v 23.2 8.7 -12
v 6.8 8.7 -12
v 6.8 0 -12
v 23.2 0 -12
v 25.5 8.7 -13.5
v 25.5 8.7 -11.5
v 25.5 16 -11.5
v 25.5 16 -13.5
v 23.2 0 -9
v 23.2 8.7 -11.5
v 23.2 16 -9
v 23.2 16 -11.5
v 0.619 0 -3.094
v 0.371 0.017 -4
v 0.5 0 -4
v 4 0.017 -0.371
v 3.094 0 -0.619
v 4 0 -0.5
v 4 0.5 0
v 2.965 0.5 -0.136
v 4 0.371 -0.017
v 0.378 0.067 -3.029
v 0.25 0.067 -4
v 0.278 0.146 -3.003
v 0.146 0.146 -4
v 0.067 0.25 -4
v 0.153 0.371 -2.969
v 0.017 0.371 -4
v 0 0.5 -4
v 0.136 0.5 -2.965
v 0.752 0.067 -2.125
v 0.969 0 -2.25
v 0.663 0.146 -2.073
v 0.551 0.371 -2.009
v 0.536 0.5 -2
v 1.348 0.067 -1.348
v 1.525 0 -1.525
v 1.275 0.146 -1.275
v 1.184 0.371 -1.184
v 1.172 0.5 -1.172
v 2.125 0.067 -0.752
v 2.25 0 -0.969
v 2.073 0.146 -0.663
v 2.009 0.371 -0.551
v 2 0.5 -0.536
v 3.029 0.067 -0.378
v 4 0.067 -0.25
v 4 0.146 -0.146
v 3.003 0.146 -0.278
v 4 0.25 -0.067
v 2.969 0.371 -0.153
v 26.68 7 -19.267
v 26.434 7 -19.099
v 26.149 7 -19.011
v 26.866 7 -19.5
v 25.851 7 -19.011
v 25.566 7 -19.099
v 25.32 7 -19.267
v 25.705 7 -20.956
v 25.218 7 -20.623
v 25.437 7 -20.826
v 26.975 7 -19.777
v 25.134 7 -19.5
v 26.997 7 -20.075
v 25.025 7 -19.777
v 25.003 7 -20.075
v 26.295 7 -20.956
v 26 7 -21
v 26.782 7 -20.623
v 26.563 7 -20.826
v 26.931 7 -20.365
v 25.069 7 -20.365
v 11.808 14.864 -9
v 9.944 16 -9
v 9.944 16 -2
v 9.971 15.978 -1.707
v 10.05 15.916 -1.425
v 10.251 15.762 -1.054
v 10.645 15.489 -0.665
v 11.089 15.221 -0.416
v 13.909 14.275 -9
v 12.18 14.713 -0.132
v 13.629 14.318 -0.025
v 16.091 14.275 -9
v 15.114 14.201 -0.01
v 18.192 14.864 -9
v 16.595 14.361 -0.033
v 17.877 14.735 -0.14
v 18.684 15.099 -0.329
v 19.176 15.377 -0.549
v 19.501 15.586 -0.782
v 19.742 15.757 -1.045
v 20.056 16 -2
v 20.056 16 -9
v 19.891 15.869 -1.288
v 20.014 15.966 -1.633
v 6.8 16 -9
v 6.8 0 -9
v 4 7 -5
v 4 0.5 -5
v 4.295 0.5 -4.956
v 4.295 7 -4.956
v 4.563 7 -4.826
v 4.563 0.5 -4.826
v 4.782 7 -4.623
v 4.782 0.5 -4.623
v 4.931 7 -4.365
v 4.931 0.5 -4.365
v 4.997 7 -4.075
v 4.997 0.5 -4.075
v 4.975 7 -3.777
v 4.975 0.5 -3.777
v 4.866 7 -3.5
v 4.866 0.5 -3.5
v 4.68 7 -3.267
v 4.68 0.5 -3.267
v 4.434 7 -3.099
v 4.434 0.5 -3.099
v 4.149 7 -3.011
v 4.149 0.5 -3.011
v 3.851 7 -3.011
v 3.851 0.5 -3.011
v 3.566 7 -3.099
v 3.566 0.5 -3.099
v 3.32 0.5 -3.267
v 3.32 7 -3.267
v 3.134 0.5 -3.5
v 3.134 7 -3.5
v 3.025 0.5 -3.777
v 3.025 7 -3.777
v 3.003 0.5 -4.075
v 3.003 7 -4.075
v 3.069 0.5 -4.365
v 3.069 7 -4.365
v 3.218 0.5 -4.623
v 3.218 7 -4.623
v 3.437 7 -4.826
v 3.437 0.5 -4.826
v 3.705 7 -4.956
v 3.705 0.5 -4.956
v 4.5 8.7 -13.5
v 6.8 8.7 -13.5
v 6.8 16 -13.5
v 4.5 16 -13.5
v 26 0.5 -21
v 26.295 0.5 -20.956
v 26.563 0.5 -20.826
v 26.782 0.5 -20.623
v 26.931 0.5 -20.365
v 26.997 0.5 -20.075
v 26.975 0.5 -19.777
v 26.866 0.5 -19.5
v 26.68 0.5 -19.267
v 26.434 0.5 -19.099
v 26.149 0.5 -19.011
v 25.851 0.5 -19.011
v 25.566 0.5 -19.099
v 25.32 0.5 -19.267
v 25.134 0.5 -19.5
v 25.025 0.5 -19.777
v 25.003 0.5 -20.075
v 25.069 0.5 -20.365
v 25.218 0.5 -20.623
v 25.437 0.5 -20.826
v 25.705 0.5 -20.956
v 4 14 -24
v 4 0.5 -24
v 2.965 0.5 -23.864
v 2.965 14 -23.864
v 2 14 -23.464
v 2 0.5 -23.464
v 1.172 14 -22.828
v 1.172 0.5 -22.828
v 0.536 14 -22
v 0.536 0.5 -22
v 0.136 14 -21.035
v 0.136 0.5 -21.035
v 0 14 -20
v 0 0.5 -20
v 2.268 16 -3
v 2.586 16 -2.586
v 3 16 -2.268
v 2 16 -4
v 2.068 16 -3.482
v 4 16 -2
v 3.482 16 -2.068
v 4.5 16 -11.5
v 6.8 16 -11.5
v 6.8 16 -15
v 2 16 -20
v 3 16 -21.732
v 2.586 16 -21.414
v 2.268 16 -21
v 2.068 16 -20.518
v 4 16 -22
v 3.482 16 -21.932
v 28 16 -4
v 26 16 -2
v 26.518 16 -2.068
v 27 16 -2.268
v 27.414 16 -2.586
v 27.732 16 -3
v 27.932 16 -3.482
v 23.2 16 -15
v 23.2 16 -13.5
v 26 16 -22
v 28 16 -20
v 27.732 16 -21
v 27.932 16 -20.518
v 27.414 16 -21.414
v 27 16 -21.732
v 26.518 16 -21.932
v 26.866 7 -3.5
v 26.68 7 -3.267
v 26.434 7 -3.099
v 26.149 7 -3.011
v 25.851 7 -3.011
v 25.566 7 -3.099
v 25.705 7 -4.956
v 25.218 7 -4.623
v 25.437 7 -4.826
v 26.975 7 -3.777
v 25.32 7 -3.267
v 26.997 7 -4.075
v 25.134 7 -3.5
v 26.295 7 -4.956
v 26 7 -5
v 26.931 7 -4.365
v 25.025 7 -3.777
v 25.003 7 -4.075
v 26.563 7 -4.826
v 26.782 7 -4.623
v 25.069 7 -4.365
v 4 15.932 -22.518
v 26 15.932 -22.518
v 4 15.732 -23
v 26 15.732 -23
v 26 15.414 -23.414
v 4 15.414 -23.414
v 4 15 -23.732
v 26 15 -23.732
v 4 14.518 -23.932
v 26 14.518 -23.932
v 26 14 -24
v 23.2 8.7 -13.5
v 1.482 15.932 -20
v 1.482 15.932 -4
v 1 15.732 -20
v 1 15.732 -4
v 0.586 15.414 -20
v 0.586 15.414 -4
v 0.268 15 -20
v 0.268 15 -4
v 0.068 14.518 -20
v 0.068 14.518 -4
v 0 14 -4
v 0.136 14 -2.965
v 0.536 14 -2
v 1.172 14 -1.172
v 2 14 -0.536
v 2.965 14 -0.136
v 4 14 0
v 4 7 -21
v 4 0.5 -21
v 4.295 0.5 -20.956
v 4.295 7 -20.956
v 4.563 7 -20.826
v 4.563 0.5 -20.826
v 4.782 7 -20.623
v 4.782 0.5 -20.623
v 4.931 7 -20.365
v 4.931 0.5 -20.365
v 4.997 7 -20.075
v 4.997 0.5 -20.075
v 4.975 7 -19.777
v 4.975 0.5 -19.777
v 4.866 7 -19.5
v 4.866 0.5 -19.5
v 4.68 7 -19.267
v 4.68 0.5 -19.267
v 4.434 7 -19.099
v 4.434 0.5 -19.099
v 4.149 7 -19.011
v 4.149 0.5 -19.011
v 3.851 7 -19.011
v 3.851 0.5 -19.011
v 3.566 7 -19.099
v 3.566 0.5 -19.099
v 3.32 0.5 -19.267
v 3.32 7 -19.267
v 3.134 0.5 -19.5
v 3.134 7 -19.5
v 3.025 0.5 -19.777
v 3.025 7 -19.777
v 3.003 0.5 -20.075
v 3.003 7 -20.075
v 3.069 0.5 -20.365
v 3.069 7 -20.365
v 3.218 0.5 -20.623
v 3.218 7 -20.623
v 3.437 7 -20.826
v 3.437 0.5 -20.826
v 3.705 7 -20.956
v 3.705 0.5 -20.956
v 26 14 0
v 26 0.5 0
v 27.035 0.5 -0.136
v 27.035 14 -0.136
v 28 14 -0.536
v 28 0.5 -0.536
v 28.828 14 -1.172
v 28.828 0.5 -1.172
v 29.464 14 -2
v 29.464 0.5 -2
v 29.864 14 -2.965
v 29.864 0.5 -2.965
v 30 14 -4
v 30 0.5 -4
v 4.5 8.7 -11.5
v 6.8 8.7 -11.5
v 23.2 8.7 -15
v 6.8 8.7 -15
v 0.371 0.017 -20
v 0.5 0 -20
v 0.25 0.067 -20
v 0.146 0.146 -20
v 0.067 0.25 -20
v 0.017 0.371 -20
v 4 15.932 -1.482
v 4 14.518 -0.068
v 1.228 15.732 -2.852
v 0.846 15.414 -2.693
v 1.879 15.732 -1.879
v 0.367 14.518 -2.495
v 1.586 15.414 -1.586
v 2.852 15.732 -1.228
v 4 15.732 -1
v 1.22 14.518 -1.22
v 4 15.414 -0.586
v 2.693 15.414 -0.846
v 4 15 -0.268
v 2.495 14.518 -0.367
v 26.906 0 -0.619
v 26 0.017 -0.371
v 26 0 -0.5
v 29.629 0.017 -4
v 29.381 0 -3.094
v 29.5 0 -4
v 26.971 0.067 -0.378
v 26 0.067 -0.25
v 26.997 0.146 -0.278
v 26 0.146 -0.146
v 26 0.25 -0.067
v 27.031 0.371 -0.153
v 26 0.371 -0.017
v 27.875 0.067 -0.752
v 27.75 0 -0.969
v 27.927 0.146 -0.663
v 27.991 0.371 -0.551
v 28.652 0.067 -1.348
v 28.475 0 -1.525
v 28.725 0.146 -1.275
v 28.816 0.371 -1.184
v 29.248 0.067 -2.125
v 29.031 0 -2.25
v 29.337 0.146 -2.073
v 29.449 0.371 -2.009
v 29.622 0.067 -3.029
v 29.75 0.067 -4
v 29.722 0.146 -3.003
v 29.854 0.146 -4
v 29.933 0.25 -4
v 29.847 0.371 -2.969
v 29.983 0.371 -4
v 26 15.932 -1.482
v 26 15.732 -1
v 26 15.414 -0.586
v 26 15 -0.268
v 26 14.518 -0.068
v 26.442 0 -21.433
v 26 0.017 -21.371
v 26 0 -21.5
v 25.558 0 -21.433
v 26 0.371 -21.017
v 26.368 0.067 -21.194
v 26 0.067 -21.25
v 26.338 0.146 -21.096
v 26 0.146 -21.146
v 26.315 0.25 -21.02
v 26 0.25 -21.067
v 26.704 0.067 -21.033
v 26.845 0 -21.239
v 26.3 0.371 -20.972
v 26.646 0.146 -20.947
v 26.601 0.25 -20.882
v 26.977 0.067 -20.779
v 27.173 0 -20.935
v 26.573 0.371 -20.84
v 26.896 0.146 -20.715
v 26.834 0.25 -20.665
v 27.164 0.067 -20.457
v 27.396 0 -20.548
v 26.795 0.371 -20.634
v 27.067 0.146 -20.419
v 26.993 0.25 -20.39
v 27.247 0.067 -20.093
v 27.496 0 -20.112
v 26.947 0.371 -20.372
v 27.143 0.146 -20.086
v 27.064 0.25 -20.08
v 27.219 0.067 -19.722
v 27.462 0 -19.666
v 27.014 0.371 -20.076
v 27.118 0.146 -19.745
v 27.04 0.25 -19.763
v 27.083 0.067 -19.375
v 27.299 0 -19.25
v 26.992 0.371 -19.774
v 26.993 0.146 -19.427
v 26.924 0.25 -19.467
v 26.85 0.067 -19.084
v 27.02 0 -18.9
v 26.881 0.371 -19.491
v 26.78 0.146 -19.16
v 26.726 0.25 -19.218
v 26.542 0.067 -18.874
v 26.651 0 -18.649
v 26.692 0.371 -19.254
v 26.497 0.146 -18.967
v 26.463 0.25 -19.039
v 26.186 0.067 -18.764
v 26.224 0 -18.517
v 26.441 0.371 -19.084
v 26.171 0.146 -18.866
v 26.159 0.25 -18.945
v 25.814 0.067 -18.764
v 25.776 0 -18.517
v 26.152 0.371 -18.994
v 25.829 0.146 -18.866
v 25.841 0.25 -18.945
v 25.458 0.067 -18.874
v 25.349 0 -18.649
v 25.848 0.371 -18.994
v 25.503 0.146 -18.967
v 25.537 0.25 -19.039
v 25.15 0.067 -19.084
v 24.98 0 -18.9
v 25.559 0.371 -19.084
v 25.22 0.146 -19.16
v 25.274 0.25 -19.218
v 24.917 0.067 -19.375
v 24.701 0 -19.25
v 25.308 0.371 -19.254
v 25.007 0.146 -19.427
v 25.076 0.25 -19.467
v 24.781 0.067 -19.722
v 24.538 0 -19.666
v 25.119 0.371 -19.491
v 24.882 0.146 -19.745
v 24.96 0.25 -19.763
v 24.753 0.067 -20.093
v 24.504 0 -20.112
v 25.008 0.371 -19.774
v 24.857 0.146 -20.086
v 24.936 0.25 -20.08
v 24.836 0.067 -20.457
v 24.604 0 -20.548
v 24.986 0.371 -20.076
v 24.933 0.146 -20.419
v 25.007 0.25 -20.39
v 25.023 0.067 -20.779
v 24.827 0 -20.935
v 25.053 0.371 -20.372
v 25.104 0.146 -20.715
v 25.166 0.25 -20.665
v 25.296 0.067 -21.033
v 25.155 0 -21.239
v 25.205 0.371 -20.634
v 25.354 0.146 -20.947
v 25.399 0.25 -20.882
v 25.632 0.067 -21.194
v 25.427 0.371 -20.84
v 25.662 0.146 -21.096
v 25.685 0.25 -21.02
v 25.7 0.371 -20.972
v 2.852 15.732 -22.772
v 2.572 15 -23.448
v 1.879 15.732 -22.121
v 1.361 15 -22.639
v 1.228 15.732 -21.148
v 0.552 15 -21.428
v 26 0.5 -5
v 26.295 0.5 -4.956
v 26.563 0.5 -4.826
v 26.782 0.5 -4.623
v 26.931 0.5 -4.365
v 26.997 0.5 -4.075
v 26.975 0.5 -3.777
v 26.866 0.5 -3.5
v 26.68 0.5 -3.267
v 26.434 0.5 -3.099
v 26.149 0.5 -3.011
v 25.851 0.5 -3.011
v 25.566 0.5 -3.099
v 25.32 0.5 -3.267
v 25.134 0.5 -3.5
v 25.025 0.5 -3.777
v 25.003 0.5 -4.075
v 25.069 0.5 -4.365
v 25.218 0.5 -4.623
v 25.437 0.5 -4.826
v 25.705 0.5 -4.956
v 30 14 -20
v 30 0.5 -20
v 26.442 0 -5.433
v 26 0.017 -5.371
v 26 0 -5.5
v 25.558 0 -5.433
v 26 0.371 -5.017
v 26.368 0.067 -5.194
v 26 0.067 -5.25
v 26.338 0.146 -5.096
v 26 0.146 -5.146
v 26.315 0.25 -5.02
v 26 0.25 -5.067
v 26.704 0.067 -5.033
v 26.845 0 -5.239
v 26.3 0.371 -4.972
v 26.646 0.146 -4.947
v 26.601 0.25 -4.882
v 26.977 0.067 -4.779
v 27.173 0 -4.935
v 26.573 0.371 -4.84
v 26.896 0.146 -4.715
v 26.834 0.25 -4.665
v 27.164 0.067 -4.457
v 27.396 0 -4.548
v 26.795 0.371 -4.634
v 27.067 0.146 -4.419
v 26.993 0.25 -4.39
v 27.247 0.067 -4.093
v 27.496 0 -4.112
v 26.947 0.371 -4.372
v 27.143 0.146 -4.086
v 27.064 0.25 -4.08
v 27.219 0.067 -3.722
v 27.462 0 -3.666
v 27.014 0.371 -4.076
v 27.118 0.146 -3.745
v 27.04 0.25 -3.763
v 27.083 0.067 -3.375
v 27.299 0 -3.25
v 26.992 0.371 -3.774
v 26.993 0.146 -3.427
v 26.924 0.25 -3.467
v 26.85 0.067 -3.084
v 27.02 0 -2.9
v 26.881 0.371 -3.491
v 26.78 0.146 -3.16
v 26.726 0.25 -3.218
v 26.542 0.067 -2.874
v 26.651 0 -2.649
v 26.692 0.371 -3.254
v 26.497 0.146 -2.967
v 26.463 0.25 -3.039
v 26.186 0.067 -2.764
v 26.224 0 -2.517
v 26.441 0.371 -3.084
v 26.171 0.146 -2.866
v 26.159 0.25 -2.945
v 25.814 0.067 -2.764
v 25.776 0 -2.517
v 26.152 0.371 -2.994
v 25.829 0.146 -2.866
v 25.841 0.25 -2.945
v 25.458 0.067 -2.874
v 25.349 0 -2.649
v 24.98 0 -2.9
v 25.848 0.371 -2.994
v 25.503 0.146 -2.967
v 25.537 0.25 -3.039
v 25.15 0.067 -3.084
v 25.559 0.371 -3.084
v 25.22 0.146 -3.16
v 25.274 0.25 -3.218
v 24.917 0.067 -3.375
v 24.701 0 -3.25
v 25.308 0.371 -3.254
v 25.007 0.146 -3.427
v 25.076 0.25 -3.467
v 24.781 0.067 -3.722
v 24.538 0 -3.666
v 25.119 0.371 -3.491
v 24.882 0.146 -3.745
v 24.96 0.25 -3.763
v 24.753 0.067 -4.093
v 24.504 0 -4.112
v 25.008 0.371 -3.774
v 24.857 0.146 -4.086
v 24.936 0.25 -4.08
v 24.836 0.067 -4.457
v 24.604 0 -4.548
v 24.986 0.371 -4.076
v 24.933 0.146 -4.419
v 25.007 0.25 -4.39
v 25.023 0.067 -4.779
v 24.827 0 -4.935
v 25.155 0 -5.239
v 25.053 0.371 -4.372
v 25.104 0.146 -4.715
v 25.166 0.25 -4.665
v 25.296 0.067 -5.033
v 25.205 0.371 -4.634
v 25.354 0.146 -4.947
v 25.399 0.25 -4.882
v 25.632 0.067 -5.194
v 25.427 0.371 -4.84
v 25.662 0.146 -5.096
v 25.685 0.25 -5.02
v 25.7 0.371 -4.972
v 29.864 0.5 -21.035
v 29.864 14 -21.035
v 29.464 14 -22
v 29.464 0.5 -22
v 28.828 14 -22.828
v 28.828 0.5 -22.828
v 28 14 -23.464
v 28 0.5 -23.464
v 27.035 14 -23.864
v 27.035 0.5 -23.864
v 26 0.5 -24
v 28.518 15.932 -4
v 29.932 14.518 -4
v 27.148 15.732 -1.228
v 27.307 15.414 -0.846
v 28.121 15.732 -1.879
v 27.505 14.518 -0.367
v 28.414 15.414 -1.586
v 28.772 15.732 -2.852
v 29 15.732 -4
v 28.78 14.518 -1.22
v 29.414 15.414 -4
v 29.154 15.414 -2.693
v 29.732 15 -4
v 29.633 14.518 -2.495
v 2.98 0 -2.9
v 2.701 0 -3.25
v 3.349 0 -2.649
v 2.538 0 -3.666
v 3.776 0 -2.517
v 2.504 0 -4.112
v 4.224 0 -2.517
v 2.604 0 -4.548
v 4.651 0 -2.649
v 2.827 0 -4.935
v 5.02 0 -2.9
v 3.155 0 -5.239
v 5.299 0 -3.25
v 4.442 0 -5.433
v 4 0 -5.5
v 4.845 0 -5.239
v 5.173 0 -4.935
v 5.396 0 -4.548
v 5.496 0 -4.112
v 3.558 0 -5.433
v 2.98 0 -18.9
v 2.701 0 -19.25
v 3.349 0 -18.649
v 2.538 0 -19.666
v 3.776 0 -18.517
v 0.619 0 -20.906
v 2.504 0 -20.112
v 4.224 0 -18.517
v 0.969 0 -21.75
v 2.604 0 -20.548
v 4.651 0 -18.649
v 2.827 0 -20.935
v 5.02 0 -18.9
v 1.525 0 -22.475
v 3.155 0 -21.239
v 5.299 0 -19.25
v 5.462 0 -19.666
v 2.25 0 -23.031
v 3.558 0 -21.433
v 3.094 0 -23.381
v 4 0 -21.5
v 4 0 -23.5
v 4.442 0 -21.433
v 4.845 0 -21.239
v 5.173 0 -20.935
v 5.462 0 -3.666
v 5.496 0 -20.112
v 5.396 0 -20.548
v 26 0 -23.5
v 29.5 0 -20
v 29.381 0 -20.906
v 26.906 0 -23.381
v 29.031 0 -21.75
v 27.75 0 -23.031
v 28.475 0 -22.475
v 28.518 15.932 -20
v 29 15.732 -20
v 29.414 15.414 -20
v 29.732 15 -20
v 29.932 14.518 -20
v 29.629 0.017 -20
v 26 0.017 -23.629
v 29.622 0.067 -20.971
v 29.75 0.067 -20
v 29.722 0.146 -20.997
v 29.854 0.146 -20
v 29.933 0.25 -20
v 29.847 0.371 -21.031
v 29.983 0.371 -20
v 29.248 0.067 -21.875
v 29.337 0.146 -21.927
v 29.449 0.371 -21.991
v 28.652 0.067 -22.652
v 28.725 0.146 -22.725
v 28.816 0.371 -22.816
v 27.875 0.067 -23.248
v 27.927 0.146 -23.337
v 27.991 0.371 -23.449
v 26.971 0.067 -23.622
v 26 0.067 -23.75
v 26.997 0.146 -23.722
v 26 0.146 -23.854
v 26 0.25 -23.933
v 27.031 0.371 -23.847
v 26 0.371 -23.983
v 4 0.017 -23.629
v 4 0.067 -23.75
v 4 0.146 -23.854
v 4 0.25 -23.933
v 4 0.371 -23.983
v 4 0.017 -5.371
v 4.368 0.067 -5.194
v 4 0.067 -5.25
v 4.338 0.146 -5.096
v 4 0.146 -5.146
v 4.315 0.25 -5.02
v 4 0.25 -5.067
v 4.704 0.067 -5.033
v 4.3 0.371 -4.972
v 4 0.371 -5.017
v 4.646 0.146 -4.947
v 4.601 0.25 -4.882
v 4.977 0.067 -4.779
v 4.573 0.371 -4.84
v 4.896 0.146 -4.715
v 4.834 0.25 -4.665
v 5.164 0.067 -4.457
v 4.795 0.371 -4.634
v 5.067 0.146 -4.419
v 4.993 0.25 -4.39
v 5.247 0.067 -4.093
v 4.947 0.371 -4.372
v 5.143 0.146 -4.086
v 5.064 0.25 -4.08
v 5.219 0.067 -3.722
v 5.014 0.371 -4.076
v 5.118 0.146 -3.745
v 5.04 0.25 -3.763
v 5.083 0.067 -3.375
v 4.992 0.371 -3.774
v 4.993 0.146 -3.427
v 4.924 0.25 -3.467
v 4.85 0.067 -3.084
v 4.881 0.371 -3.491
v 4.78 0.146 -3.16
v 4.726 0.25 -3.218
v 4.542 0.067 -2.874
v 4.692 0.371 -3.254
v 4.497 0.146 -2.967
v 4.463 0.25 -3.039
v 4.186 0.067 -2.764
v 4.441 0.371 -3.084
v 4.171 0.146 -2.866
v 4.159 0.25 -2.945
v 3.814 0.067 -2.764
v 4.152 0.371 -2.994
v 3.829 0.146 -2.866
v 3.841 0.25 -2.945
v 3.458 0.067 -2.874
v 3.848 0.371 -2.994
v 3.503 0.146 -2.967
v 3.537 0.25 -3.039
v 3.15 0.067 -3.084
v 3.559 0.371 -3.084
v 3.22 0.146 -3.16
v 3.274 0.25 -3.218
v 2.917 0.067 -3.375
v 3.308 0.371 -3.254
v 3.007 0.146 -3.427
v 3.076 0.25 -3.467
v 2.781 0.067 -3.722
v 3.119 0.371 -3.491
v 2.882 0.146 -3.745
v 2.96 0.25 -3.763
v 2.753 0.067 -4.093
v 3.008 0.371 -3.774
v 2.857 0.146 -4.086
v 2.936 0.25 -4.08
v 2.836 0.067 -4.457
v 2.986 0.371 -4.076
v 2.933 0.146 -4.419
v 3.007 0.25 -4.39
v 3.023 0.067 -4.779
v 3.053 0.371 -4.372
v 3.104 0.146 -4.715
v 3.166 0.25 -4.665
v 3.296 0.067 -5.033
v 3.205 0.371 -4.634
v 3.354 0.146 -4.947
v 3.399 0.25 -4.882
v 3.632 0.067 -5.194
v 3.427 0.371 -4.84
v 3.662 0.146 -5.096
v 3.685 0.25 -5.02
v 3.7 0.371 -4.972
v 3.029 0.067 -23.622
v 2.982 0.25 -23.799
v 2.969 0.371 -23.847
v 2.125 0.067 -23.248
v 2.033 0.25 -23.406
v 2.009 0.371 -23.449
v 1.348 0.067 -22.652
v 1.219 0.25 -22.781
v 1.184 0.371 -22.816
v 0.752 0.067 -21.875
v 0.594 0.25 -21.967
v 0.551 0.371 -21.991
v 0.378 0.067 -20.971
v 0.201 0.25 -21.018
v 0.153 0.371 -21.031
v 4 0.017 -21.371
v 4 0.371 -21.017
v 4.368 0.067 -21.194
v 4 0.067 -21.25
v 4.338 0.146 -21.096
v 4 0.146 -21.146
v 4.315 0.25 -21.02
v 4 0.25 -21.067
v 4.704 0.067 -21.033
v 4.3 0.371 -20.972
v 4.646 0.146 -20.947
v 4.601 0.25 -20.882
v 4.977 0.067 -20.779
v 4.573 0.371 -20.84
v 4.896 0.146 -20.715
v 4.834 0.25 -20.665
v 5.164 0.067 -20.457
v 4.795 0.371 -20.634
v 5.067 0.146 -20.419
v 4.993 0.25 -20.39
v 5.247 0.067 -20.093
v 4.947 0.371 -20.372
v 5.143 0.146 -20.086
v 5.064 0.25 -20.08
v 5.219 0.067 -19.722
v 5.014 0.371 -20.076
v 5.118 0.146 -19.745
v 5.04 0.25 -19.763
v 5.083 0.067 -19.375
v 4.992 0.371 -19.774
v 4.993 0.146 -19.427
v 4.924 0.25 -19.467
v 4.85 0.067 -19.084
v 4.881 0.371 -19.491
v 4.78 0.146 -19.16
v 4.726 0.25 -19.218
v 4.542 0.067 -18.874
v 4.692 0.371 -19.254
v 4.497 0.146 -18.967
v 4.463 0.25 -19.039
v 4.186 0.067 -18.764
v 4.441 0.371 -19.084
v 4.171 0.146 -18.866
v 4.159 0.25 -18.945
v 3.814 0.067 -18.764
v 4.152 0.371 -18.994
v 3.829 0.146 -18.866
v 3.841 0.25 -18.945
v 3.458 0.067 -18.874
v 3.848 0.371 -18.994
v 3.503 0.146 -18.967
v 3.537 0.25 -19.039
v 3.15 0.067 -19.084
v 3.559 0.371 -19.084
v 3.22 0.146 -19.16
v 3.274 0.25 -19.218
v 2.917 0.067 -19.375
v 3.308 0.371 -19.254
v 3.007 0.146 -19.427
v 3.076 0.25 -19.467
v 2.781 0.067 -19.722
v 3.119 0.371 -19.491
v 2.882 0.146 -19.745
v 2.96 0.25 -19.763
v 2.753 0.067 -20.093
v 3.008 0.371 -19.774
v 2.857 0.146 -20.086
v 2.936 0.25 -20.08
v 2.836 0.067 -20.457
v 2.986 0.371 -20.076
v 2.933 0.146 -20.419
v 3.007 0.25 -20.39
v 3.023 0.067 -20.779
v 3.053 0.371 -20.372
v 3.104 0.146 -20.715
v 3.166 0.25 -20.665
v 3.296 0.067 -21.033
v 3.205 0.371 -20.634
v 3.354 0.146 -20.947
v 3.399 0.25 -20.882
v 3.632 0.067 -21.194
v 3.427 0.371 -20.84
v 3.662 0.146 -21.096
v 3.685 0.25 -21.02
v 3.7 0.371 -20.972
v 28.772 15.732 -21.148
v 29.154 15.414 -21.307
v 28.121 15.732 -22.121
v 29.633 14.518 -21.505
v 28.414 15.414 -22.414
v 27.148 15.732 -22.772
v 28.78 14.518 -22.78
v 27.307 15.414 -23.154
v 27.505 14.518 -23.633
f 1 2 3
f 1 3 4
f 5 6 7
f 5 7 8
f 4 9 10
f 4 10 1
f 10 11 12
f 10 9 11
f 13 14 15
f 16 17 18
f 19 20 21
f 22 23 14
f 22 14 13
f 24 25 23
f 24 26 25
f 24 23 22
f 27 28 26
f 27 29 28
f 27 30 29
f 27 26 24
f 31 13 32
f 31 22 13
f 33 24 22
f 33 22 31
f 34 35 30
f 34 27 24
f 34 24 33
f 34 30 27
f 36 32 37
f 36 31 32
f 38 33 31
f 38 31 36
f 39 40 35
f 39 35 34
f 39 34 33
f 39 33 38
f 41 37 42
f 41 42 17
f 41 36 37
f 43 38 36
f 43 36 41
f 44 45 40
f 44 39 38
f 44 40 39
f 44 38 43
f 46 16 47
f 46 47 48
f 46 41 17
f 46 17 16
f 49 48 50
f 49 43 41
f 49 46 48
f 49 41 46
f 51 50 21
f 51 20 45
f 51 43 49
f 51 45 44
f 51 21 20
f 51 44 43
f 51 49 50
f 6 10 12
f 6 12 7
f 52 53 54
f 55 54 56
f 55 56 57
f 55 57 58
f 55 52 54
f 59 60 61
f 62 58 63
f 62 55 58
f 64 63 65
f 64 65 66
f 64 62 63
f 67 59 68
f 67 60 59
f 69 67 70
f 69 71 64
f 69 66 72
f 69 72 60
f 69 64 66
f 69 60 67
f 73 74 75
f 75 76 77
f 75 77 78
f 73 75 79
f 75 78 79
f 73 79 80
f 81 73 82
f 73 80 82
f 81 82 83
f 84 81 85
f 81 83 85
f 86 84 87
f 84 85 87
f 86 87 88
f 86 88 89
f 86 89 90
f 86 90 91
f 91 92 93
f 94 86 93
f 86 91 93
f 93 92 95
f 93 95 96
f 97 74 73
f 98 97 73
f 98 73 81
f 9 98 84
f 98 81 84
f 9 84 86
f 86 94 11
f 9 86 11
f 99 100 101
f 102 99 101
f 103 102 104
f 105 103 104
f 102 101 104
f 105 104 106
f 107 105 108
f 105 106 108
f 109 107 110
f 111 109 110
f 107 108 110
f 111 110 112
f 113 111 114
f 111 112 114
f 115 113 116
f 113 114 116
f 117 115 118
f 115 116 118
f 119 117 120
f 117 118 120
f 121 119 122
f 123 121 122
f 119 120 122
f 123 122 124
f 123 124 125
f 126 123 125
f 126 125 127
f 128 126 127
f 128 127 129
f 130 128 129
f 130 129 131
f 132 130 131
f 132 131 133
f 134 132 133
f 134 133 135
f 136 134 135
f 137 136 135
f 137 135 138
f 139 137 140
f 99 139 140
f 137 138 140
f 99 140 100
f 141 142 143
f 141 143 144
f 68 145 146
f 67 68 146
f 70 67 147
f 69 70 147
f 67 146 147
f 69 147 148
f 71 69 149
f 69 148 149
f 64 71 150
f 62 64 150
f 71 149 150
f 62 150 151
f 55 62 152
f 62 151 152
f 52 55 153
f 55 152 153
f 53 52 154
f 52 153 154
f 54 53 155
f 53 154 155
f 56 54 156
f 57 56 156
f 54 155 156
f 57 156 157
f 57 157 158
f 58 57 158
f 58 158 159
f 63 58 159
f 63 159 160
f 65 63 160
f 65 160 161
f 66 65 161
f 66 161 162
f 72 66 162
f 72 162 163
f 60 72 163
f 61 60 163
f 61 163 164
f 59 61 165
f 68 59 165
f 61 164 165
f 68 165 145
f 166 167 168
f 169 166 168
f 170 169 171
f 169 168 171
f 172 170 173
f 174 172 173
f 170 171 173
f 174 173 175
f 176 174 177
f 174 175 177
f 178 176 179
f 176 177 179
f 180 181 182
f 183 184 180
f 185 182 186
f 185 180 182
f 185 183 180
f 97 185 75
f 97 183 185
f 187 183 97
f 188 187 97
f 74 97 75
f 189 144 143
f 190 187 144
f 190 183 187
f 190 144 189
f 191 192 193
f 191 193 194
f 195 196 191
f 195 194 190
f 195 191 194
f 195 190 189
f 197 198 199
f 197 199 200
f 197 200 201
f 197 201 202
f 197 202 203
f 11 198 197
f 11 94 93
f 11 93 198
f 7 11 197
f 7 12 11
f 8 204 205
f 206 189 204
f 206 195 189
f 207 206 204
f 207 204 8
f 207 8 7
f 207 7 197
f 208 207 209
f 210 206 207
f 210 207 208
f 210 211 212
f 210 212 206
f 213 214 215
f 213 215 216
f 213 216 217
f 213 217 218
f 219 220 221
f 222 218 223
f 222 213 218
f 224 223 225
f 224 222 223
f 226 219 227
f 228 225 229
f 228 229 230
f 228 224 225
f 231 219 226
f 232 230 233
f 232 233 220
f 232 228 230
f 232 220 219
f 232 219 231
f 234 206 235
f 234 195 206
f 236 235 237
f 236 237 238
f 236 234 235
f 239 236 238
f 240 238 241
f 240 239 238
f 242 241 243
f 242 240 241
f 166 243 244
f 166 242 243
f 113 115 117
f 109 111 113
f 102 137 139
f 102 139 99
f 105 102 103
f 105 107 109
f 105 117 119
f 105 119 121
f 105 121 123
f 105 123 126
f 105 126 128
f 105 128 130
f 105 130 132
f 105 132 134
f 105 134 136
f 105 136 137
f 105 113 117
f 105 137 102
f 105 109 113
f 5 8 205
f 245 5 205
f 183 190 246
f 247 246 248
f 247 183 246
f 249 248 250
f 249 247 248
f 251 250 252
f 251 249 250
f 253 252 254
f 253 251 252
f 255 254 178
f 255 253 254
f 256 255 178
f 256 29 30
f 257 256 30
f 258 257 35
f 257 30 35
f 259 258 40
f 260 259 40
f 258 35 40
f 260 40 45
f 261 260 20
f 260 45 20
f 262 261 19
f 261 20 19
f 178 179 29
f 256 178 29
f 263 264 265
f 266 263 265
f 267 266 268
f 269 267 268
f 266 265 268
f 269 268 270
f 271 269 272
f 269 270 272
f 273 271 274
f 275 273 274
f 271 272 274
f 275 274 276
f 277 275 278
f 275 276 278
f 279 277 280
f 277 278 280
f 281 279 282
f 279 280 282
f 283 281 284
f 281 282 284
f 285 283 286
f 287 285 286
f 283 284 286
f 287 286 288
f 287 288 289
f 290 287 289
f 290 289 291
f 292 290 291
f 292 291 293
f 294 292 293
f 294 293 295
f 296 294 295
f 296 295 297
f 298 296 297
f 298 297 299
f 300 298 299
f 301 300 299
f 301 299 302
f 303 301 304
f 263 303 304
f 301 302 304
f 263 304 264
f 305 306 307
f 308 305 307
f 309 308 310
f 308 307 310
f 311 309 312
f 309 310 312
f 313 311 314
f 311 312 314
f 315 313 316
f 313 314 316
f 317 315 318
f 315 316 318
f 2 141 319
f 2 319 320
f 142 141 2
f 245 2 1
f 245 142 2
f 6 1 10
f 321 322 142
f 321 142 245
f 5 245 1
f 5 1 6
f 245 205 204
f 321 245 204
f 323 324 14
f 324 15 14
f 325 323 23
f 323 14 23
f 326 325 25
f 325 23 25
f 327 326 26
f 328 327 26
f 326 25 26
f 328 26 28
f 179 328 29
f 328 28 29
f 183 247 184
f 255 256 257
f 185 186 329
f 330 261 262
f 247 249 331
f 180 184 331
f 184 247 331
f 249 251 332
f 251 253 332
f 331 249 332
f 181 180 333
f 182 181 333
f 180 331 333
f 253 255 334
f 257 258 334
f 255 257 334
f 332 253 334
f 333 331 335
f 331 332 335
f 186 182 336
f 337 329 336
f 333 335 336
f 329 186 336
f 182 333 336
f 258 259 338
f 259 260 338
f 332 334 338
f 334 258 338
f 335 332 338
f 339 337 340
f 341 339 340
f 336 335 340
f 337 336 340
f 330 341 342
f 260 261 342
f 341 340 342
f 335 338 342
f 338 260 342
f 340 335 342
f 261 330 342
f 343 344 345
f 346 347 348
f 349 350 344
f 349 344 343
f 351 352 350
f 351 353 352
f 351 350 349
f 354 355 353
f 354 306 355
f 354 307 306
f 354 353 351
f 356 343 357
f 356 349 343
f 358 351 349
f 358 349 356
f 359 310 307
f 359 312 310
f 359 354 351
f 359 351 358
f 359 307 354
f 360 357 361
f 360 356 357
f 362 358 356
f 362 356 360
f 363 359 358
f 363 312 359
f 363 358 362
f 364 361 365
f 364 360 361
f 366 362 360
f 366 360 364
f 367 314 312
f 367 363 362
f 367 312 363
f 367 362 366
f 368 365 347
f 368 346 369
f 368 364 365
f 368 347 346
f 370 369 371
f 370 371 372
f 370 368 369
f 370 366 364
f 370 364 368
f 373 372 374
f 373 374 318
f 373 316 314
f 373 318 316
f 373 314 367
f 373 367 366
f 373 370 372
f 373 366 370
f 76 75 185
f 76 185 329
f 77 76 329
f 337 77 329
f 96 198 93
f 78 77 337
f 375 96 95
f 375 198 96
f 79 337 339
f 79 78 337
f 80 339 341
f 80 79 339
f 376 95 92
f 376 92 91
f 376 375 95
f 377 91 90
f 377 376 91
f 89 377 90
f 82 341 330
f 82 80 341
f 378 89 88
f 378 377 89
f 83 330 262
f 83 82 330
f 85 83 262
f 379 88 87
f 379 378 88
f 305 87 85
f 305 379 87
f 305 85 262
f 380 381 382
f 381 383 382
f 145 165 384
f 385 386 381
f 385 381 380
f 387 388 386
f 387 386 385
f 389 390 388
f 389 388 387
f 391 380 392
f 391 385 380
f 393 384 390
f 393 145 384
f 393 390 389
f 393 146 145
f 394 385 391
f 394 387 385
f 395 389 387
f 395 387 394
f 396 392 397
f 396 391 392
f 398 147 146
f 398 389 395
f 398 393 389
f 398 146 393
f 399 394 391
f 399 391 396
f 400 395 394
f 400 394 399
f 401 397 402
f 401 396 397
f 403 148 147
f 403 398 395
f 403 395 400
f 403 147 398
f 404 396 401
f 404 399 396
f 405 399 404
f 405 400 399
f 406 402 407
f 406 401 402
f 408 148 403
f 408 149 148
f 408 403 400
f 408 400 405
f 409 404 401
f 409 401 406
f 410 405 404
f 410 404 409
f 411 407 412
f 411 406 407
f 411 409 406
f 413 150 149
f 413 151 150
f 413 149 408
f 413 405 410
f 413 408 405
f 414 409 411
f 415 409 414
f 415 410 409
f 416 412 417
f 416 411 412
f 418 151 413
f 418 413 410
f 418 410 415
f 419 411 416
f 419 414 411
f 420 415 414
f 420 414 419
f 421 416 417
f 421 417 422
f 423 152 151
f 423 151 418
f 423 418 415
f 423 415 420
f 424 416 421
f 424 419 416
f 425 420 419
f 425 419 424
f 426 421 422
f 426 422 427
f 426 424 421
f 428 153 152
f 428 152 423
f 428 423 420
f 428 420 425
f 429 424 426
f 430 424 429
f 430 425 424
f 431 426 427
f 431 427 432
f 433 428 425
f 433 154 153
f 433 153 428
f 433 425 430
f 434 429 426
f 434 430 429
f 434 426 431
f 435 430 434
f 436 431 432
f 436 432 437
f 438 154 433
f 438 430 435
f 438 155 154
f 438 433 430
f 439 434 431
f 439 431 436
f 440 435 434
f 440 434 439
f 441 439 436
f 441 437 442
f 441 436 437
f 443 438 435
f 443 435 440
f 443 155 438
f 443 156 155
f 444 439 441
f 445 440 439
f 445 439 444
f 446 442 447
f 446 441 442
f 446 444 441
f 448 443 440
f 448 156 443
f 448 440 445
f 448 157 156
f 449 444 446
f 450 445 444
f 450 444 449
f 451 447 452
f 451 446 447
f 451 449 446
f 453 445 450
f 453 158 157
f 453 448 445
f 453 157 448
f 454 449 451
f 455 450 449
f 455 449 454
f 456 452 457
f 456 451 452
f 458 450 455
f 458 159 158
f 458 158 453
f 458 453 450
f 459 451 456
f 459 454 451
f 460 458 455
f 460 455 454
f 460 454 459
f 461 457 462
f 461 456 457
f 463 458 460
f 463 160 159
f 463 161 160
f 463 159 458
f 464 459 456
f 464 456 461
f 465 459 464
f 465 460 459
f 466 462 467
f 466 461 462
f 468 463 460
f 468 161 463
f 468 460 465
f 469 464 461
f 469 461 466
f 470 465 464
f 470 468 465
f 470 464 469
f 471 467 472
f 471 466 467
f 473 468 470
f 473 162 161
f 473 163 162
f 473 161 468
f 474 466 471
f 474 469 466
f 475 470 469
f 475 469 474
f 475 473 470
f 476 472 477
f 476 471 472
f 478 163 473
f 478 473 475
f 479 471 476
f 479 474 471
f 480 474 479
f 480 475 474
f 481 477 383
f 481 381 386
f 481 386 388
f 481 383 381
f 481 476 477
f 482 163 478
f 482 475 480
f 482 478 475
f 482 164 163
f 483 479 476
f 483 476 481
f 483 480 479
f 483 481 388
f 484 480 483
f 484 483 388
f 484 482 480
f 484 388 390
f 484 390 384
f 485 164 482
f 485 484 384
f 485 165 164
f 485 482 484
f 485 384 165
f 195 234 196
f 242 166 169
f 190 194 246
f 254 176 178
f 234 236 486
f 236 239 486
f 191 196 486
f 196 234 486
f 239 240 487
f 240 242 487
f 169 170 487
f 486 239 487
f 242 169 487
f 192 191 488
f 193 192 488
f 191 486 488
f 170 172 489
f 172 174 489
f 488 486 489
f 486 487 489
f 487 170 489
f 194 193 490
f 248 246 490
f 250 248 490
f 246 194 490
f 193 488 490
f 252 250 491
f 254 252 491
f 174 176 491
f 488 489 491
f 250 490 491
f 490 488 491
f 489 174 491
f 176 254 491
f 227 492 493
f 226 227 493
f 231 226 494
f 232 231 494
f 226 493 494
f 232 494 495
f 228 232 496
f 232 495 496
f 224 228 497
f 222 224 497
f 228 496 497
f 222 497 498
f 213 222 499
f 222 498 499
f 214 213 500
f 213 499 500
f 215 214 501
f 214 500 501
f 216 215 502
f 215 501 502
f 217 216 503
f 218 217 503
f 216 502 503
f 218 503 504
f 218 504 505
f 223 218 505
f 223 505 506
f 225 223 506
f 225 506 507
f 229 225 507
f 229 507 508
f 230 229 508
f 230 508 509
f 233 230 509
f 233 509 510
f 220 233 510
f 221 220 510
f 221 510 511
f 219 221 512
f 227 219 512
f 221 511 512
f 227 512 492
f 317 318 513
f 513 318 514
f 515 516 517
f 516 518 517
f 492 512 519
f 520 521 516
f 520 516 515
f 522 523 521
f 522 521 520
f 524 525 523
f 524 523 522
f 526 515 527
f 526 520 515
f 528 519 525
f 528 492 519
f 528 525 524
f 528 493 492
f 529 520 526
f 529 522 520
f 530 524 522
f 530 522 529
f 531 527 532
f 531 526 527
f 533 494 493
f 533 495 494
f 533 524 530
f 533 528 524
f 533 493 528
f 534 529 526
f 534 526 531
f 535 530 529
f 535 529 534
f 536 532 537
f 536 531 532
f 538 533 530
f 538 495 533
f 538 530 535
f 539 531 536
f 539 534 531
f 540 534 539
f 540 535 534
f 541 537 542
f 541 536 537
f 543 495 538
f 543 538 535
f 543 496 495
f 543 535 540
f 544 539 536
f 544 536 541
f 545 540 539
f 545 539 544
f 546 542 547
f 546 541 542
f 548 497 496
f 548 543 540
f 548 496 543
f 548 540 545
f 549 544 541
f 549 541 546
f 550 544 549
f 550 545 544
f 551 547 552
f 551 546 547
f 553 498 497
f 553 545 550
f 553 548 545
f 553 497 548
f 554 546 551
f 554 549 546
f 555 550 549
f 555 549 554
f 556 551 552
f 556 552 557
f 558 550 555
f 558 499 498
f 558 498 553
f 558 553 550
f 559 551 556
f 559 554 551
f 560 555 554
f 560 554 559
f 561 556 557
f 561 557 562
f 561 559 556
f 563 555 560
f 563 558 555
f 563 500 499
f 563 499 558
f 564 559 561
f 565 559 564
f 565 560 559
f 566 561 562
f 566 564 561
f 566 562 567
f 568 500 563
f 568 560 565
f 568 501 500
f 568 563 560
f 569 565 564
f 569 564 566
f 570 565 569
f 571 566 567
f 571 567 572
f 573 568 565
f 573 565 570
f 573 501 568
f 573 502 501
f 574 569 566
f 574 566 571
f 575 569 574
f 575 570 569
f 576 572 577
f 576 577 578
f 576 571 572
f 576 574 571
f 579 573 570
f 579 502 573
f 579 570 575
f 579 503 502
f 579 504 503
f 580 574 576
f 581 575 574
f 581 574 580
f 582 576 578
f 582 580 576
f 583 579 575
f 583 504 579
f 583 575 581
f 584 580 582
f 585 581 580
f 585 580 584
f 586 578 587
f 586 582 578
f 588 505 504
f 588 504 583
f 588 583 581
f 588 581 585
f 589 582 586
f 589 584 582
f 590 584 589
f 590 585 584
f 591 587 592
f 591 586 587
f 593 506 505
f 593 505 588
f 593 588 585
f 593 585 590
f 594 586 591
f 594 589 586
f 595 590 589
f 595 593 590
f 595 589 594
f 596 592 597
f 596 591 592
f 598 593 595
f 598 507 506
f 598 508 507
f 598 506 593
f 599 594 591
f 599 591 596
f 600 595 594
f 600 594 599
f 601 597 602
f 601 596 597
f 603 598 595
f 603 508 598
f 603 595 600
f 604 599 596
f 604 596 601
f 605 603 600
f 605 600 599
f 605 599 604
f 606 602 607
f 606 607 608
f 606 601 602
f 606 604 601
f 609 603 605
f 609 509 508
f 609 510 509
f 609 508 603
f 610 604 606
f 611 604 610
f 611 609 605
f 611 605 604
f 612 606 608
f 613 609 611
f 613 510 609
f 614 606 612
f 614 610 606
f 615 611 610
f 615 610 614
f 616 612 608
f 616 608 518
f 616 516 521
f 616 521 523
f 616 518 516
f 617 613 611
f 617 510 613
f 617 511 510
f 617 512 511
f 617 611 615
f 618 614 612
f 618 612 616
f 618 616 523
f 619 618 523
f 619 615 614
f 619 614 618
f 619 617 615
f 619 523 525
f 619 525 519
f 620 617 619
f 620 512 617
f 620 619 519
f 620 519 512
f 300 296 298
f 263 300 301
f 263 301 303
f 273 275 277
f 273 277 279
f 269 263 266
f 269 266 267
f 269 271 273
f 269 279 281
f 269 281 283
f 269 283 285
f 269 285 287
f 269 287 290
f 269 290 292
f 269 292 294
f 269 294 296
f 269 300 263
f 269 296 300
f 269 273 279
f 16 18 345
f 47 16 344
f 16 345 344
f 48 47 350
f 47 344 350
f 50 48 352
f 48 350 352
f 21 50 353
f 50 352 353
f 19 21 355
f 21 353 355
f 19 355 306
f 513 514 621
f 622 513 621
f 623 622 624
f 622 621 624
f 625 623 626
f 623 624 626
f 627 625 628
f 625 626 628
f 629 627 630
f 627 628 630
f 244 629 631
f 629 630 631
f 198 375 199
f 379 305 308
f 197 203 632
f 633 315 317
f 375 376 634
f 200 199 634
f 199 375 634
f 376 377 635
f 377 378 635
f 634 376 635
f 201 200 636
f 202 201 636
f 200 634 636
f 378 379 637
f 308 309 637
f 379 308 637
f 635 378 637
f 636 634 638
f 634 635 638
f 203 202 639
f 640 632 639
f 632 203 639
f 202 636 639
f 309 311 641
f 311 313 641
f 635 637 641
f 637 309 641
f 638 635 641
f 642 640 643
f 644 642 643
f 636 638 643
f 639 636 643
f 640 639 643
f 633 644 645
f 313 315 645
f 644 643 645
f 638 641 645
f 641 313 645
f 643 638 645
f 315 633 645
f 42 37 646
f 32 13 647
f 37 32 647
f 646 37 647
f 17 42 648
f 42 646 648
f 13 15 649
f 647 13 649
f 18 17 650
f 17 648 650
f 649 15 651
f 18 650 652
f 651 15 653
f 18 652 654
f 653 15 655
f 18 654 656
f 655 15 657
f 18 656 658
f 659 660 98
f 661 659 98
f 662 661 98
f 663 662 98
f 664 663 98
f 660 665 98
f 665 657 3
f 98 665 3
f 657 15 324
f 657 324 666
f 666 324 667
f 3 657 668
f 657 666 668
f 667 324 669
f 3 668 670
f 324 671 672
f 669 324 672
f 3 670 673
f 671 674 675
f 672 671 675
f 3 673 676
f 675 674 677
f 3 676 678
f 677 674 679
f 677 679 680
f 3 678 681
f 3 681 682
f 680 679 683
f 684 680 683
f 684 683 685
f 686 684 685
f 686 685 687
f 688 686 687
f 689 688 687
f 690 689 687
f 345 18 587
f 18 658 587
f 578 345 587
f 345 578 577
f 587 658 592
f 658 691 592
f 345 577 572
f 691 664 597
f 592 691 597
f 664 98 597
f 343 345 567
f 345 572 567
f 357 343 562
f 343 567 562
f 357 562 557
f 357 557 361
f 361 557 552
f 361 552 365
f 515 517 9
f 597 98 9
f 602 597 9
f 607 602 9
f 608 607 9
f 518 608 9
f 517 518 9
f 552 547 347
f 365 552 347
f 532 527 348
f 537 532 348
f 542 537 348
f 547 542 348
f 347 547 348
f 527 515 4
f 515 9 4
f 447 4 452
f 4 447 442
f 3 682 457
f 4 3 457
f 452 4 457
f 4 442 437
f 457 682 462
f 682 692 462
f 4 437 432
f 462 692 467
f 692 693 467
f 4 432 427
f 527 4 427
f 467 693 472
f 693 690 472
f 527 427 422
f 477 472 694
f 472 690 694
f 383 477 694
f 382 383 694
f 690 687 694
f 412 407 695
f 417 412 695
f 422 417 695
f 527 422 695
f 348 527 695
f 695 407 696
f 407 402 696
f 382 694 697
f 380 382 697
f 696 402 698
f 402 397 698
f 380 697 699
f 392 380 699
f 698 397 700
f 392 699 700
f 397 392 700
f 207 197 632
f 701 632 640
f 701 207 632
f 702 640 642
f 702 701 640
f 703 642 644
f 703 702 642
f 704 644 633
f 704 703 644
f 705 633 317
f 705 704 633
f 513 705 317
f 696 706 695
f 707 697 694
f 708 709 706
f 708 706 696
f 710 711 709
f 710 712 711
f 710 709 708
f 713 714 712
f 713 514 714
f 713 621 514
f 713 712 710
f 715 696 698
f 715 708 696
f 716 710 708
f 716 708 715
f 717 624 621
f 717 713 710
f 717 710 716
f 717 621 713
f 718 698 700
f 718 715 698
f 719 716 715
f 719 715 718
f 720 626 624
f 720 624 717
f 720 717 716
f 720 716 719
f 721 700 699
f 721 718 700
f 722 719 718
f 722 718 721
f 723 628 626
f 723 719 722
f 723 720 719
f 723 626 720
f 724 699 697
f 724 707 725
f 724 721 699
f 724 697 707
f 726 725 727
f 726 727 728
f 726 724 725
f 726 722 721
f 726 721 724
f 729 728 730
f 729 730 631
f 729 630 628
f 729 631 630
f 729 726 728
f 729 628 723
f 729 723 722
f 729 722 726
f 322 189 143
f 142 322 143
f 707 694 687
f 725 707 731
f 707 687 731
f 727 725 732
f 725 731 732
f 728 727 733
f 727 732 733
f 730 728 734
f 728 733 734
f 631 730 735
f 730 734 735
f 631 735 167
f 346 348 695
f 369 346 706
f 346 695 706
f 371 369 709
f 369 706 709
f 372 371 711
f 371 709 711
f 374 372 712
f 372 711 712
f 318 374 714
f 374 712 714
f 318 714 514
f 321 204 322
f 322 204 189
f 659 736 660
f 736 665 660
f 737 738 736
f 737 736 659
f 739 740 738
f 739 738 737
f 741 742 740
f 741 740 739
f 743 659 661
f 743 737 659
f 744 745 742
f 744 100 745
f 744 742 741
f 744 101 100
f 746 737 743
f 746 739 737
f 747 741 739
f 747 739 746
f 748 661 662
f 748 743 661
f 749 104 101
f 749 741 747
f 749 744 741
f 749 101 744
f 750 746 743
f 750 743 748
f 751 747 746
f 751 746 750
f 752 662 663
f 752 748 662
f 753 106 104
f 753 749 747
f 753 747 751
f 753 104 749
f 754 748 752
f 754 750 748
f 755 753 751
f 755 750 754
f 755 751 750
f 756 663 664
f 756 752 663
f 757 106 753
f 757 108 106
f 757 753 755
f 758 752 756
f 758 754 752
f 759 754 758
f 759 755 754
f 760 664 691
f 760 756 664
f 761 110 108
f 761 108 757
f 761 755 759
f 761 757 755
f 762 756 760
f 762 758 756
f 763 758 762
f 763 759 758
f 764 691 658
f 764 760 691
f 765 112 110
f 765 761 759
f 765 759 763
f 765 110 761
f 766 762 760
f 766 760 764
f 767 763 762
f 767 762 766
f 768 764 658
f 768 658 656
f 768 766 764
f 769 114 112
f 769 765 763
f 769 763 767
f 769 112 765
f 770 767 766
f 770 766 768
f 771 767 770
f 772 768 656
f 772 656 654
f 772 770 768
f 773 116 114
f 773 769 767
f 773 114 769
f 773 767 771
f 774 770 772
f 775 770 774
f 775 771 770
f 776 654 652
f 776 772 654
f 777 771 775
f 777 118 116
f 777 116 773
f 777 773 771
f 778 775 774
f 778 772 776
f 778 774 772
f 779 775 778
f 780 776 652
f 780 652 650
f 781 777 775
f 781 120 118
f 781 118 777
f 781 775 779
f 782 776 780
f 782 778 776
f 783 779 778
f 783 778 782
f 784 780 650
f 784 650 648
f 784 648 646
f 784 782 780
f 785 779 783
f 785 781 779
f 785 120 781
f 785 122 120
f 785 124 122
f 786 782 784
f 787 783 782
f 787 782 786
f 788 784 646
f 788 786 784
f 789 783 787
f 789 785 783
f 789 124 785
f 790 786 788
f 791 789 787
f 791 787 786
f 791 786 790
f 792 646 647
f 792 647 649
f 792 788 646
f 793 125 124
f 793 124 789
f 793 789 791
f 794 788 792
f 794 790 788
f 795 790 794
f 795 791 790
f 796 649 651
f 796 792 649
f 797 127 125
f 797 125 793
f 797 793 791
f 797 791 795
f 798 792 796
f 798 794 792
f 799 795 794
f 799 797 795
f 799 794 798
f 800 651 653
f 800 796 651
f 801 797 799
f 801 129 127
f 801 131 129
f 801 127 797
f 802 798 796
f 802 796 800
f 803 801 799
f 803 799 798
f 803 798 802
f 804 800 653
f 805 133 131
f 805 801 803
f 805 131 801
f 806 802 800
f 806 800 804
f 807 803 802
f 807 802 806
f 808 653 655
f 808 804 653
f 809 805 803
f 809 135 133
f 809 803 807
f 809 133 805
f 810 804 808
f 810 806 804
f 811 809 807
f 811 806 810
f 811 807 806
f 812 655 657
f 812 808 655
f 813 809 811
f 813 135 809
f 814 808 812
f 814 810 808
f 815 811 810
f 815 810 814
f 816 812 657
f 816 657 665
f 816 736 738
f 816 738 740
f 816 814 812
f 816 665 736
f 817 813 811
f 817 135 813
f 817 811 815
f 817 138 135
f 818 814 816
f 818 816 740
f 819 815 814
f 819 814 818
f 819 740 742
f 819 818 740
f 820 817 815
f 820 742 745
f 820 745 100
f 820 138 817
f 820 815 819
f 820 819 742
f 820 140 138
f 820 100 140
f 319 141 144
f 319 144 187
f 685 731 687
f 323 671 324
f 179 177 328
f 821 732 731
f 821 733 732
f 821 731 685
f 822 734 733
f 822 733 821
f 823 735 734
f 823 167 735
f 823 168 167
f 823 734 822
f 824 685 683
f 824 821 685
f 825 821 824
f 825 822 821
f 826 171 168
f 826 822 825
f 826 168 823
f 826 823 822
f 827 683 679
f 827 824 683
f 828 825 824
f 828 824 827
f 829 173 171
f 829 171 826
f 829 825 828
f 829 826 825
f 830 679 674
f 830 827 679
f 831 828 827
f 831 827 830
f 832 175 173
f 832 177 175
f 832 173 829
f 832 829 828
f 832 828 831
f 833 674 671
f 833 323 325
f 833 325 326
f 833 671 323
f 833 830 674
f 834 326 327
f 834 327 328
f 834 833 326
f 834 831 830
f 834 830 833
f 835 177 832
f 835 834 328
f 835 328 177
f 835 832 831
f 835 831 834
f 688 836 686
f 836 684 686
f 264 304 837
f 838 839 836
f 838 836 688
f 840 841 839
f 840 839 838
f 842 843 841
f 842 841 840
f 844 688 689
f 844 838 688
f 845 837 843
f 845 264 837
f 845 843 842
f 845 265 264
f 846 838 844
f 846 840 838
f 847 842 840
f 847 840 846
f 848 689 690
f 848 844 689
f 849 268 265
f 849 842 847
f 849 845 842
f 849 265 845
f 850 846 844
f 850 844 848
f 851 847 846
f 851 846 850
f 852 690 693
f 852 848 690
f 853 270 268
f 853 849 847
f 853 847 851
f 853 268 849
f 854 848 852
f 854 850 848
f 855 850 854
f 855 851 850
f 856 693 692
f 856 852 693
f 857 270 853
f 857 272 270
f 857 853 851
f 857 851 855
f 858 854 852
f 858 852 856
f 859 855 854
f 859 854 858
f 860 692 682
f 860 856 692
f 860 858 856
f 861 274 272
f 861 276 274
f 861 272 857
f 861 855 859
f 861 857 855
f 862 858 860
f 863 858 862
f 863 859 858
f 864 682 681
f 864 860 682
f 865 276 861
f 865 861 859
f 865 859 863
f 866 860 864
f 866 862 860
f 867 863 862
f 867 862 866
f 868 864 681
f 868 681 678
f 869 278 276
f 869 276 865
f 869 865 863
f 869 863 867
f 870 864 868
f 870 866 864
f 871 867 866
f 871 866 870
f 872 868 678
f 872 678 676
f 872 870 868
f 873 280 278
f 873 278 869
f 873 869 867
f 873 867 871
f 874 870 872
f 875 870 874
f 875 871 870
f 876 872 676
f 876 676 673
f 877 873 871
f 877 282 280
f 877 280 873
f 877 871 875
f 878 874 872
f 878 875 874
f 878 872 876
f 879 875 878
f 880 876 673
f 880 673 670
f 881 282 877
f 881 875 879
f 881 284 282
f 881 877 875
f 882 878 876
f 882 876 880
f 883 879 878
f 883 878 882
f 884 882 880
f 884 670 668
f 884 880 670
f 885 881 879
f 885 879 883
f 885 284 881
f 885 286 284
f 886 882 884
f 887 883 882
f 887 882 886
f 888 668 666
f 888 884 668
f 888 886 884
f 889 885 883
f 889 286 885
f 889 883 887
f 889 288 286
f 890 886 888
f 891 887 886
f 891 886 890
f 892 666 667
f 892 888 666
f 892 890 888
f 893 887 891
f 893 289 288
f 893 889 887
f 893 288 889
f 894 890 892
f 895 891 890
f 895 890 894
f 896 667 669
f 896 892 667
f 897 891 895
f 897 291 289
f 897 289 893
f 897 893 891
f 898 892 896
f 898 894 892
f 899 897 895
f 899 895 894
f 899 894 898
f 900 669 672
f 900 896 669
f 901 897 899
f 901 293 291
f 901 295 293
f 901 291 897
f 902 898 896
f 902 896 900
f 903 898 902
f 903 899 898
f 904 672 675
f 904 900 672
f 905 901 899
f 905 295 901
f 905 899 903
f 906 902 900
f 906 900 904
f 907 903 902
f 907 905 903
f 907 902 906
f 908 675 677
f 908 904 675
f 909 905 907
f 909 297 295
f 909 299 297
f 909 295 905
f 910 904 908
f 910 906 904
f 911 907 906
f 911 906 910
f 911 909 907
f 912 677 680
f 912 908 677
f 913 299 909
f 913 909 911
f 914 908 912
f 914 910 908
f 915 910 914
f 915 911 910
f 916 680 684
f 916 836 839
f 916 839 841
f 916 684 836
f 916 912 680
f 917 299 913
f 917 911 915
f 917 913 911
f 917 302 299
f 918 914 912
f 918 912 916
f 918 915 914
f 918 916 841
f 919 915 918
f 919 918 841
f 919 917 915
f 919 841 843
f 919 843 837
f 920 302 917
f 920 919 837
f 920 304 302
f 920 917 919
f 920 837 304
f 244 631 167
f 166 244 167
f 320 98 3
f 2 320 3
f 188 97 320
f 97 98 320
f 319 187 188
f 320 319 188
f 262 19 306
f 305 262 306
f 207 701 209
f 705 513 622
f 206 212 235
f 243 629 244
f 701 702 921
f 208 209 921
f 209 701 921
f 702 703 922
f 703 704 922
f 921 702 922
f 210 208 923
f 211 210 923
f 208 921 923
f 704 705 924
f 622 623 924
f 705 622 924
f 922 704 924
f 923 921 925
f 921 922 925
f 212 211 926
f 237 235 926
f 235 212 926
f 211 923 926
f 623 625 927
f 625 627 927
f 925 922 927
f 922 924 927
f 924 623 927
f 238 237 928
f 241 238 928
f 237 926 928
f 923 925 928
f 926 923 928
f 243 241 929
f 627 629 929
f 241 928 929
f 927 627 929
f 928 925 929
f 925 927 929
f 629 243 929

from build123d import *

# Parameters (mm, degrees)
EXTRUDE_1_DEPTH     = 16
SKETCH_6_R          = 1
CUT_EXTRUDE_5_DEPTH = 7
FILLET_2_R          = 0.5
FILLET_1_R          = 2
CUT_EXTRUDE_1_REACH = 43.617
SKETCH_3_W          = 16.4
SKETCH_3_H          = 3
CUT_EXTRUDE_6_DEPTH = 7.3
CUT_EXTRUDE_7_REACH = 43.617
SKETCH_8_R          = 8


with BuildPart() as part:
    # Эскиз1 → Бобышка-Вытянуть1 (new body)
    with BuildSketch(Plane(origin=(0, 0, 0), x_dir=(1, 0, 0), z_dir=(0, 1, 0))):
        with BuildLine():
            Line((4, 0), (26, 0))
            ThreePointArc((26, 0), (28.828427125, 1.171572875), (30, 4))
            Line((30, 4), (30, 20))
            ThreePointArc((30, 20), (28.828427125, 22.828427125), (26, 24))
            Line((26, 24), (4, 24))
            ThreePointArc((4, 24), (1.171572875, 22.828427125), (0, 20))
            Line((0, 20), (0, 4))
            ThreePointArc((0, 4), (1.171572875, 1.171572875), (4, 0))
        make_face()
    extrude(amount=EXTRUDE_1_DEPTH)

    # Эскиз6 → Вырез-Вытянуть5 (cut)
    with BuildSketch(Plane.XZ):
        with Locations(Location((4, -4, 0), (0, 0, 270))):
            Circle(SKETCH_6_R)
        with Locations(Location((26, -4, 0), (0, 0, 270))):
            Circle(SKETCH_6_R)
        with Locations(Location((26, -20, 0), (0, 0, 270))):
            Circle(SKETCH_6_R)
        with Locations(Location((4, -20, 0), (0, 0, 270))):
            Circle(SKETCH_6_R)
    extrude(amount=-CUT_EXTRUDE_5_DEPTH, mode=Mode.SUBTRACT)

    # Скругление2
    fillet_2_edges = [part.edges().sort_by_distance(p)[0] for p in [
        (0, 0, -12),
        (1.171572875, 0, -22.828427125),
        (15, 0, -24),
        (28.828427125, 0, -22.828427125),
        (4, 0, -19),
        (26, 0, -19),
        (26, 0, -3),
        (4, 0, -3),
        (30, 0, -12),
        (28.828427125, 0, -1.171572875),
        (15, 0, 0),
        (1.171572875, 0, -1.171572875),
    ]]
    fillet(fillet_2_edges, radius=FILLET_2_R)

    # Скругление1
    fillet_1_edges = [part.edges().sort_by_distance(p)[0] for p in [
        (1.171572875, 16, -22.828427125),
        (0, 16, -12),
        (1.171572875, 16, -1.171572875),
        (15, 16, 0),
        (28.828427125, 16, -1.171572875),
        (30, 16, -12),
        (28.828427125, 16, -22.828427125),
        (15, 16, -24),
    ]]
    fillet(fillet_1_edges, radius=FILLET_1_R)

    # Эскиз3 → Вырез-Вытянуть1 (cut, up to next)
    with BuildSketch(Plane(origin=(0, 16, 0), x_dir=(1, 0, 0), z_dir=(0, 1, 0)), mode=Mode.PRIVATE) as cut_extrude_1_sk1:
        with Locations((15, 10.5)):
            Rectangle(SKETCH_3_W, SKETCH_3_H)
    cut_extrude_1_tool1 = extrude(cut_extrude_1_sk1.sketch, amount=-CUT_EXTRUDE_1_REACH, mode=Mode.PRIVATE) & part.part
    add(cut_extrude_1_tool1.solids().sort_by_distance((15, 16, -10.5))[0], mode=Mode.SUBTRACT)

    # Эскиз7 → Вырез-Вытянуть6 (cut)
    with BuildSketch(Plane(origin=(0, 16, 0), x_dir=(1, 0, 0), z_dir=(0, 1, 0))):
        Polygon((4.5, 11.5), (25.5, 11.5), (25.5, 13.5), (23.2, 13.5), (23.2, 15), (6.8, 15), (6.8, 13.5), (4.5, 13.5), align=None)
    extrude(amount=-CUT_EXTRUDE_6_DEPTH, mode=Mode.SUBTRACT)

    # Эскиз8 → Вырез-Вытянуть7 (cut, up to next)
    with BuildSketch(Plane.XY, mode=Mode.PRIVATE) as cut_extrude_7_sk1:
        with Locations((15, 22.2)):
            Circle(SKETCH_8_R)
    cut_extrude_7_tool1 = extrude(cut_extrude_7_sk1.sketch, amount=-CUT_EXTRUDE_7_REACH, mode=Mode.PRIVATE) & part.part
    add(cut_extrude_7_tool1.solids().sort_by_distance((15, 22.2, 0))[0], mode=Mode.SUBTRACT)


solid = part.part
